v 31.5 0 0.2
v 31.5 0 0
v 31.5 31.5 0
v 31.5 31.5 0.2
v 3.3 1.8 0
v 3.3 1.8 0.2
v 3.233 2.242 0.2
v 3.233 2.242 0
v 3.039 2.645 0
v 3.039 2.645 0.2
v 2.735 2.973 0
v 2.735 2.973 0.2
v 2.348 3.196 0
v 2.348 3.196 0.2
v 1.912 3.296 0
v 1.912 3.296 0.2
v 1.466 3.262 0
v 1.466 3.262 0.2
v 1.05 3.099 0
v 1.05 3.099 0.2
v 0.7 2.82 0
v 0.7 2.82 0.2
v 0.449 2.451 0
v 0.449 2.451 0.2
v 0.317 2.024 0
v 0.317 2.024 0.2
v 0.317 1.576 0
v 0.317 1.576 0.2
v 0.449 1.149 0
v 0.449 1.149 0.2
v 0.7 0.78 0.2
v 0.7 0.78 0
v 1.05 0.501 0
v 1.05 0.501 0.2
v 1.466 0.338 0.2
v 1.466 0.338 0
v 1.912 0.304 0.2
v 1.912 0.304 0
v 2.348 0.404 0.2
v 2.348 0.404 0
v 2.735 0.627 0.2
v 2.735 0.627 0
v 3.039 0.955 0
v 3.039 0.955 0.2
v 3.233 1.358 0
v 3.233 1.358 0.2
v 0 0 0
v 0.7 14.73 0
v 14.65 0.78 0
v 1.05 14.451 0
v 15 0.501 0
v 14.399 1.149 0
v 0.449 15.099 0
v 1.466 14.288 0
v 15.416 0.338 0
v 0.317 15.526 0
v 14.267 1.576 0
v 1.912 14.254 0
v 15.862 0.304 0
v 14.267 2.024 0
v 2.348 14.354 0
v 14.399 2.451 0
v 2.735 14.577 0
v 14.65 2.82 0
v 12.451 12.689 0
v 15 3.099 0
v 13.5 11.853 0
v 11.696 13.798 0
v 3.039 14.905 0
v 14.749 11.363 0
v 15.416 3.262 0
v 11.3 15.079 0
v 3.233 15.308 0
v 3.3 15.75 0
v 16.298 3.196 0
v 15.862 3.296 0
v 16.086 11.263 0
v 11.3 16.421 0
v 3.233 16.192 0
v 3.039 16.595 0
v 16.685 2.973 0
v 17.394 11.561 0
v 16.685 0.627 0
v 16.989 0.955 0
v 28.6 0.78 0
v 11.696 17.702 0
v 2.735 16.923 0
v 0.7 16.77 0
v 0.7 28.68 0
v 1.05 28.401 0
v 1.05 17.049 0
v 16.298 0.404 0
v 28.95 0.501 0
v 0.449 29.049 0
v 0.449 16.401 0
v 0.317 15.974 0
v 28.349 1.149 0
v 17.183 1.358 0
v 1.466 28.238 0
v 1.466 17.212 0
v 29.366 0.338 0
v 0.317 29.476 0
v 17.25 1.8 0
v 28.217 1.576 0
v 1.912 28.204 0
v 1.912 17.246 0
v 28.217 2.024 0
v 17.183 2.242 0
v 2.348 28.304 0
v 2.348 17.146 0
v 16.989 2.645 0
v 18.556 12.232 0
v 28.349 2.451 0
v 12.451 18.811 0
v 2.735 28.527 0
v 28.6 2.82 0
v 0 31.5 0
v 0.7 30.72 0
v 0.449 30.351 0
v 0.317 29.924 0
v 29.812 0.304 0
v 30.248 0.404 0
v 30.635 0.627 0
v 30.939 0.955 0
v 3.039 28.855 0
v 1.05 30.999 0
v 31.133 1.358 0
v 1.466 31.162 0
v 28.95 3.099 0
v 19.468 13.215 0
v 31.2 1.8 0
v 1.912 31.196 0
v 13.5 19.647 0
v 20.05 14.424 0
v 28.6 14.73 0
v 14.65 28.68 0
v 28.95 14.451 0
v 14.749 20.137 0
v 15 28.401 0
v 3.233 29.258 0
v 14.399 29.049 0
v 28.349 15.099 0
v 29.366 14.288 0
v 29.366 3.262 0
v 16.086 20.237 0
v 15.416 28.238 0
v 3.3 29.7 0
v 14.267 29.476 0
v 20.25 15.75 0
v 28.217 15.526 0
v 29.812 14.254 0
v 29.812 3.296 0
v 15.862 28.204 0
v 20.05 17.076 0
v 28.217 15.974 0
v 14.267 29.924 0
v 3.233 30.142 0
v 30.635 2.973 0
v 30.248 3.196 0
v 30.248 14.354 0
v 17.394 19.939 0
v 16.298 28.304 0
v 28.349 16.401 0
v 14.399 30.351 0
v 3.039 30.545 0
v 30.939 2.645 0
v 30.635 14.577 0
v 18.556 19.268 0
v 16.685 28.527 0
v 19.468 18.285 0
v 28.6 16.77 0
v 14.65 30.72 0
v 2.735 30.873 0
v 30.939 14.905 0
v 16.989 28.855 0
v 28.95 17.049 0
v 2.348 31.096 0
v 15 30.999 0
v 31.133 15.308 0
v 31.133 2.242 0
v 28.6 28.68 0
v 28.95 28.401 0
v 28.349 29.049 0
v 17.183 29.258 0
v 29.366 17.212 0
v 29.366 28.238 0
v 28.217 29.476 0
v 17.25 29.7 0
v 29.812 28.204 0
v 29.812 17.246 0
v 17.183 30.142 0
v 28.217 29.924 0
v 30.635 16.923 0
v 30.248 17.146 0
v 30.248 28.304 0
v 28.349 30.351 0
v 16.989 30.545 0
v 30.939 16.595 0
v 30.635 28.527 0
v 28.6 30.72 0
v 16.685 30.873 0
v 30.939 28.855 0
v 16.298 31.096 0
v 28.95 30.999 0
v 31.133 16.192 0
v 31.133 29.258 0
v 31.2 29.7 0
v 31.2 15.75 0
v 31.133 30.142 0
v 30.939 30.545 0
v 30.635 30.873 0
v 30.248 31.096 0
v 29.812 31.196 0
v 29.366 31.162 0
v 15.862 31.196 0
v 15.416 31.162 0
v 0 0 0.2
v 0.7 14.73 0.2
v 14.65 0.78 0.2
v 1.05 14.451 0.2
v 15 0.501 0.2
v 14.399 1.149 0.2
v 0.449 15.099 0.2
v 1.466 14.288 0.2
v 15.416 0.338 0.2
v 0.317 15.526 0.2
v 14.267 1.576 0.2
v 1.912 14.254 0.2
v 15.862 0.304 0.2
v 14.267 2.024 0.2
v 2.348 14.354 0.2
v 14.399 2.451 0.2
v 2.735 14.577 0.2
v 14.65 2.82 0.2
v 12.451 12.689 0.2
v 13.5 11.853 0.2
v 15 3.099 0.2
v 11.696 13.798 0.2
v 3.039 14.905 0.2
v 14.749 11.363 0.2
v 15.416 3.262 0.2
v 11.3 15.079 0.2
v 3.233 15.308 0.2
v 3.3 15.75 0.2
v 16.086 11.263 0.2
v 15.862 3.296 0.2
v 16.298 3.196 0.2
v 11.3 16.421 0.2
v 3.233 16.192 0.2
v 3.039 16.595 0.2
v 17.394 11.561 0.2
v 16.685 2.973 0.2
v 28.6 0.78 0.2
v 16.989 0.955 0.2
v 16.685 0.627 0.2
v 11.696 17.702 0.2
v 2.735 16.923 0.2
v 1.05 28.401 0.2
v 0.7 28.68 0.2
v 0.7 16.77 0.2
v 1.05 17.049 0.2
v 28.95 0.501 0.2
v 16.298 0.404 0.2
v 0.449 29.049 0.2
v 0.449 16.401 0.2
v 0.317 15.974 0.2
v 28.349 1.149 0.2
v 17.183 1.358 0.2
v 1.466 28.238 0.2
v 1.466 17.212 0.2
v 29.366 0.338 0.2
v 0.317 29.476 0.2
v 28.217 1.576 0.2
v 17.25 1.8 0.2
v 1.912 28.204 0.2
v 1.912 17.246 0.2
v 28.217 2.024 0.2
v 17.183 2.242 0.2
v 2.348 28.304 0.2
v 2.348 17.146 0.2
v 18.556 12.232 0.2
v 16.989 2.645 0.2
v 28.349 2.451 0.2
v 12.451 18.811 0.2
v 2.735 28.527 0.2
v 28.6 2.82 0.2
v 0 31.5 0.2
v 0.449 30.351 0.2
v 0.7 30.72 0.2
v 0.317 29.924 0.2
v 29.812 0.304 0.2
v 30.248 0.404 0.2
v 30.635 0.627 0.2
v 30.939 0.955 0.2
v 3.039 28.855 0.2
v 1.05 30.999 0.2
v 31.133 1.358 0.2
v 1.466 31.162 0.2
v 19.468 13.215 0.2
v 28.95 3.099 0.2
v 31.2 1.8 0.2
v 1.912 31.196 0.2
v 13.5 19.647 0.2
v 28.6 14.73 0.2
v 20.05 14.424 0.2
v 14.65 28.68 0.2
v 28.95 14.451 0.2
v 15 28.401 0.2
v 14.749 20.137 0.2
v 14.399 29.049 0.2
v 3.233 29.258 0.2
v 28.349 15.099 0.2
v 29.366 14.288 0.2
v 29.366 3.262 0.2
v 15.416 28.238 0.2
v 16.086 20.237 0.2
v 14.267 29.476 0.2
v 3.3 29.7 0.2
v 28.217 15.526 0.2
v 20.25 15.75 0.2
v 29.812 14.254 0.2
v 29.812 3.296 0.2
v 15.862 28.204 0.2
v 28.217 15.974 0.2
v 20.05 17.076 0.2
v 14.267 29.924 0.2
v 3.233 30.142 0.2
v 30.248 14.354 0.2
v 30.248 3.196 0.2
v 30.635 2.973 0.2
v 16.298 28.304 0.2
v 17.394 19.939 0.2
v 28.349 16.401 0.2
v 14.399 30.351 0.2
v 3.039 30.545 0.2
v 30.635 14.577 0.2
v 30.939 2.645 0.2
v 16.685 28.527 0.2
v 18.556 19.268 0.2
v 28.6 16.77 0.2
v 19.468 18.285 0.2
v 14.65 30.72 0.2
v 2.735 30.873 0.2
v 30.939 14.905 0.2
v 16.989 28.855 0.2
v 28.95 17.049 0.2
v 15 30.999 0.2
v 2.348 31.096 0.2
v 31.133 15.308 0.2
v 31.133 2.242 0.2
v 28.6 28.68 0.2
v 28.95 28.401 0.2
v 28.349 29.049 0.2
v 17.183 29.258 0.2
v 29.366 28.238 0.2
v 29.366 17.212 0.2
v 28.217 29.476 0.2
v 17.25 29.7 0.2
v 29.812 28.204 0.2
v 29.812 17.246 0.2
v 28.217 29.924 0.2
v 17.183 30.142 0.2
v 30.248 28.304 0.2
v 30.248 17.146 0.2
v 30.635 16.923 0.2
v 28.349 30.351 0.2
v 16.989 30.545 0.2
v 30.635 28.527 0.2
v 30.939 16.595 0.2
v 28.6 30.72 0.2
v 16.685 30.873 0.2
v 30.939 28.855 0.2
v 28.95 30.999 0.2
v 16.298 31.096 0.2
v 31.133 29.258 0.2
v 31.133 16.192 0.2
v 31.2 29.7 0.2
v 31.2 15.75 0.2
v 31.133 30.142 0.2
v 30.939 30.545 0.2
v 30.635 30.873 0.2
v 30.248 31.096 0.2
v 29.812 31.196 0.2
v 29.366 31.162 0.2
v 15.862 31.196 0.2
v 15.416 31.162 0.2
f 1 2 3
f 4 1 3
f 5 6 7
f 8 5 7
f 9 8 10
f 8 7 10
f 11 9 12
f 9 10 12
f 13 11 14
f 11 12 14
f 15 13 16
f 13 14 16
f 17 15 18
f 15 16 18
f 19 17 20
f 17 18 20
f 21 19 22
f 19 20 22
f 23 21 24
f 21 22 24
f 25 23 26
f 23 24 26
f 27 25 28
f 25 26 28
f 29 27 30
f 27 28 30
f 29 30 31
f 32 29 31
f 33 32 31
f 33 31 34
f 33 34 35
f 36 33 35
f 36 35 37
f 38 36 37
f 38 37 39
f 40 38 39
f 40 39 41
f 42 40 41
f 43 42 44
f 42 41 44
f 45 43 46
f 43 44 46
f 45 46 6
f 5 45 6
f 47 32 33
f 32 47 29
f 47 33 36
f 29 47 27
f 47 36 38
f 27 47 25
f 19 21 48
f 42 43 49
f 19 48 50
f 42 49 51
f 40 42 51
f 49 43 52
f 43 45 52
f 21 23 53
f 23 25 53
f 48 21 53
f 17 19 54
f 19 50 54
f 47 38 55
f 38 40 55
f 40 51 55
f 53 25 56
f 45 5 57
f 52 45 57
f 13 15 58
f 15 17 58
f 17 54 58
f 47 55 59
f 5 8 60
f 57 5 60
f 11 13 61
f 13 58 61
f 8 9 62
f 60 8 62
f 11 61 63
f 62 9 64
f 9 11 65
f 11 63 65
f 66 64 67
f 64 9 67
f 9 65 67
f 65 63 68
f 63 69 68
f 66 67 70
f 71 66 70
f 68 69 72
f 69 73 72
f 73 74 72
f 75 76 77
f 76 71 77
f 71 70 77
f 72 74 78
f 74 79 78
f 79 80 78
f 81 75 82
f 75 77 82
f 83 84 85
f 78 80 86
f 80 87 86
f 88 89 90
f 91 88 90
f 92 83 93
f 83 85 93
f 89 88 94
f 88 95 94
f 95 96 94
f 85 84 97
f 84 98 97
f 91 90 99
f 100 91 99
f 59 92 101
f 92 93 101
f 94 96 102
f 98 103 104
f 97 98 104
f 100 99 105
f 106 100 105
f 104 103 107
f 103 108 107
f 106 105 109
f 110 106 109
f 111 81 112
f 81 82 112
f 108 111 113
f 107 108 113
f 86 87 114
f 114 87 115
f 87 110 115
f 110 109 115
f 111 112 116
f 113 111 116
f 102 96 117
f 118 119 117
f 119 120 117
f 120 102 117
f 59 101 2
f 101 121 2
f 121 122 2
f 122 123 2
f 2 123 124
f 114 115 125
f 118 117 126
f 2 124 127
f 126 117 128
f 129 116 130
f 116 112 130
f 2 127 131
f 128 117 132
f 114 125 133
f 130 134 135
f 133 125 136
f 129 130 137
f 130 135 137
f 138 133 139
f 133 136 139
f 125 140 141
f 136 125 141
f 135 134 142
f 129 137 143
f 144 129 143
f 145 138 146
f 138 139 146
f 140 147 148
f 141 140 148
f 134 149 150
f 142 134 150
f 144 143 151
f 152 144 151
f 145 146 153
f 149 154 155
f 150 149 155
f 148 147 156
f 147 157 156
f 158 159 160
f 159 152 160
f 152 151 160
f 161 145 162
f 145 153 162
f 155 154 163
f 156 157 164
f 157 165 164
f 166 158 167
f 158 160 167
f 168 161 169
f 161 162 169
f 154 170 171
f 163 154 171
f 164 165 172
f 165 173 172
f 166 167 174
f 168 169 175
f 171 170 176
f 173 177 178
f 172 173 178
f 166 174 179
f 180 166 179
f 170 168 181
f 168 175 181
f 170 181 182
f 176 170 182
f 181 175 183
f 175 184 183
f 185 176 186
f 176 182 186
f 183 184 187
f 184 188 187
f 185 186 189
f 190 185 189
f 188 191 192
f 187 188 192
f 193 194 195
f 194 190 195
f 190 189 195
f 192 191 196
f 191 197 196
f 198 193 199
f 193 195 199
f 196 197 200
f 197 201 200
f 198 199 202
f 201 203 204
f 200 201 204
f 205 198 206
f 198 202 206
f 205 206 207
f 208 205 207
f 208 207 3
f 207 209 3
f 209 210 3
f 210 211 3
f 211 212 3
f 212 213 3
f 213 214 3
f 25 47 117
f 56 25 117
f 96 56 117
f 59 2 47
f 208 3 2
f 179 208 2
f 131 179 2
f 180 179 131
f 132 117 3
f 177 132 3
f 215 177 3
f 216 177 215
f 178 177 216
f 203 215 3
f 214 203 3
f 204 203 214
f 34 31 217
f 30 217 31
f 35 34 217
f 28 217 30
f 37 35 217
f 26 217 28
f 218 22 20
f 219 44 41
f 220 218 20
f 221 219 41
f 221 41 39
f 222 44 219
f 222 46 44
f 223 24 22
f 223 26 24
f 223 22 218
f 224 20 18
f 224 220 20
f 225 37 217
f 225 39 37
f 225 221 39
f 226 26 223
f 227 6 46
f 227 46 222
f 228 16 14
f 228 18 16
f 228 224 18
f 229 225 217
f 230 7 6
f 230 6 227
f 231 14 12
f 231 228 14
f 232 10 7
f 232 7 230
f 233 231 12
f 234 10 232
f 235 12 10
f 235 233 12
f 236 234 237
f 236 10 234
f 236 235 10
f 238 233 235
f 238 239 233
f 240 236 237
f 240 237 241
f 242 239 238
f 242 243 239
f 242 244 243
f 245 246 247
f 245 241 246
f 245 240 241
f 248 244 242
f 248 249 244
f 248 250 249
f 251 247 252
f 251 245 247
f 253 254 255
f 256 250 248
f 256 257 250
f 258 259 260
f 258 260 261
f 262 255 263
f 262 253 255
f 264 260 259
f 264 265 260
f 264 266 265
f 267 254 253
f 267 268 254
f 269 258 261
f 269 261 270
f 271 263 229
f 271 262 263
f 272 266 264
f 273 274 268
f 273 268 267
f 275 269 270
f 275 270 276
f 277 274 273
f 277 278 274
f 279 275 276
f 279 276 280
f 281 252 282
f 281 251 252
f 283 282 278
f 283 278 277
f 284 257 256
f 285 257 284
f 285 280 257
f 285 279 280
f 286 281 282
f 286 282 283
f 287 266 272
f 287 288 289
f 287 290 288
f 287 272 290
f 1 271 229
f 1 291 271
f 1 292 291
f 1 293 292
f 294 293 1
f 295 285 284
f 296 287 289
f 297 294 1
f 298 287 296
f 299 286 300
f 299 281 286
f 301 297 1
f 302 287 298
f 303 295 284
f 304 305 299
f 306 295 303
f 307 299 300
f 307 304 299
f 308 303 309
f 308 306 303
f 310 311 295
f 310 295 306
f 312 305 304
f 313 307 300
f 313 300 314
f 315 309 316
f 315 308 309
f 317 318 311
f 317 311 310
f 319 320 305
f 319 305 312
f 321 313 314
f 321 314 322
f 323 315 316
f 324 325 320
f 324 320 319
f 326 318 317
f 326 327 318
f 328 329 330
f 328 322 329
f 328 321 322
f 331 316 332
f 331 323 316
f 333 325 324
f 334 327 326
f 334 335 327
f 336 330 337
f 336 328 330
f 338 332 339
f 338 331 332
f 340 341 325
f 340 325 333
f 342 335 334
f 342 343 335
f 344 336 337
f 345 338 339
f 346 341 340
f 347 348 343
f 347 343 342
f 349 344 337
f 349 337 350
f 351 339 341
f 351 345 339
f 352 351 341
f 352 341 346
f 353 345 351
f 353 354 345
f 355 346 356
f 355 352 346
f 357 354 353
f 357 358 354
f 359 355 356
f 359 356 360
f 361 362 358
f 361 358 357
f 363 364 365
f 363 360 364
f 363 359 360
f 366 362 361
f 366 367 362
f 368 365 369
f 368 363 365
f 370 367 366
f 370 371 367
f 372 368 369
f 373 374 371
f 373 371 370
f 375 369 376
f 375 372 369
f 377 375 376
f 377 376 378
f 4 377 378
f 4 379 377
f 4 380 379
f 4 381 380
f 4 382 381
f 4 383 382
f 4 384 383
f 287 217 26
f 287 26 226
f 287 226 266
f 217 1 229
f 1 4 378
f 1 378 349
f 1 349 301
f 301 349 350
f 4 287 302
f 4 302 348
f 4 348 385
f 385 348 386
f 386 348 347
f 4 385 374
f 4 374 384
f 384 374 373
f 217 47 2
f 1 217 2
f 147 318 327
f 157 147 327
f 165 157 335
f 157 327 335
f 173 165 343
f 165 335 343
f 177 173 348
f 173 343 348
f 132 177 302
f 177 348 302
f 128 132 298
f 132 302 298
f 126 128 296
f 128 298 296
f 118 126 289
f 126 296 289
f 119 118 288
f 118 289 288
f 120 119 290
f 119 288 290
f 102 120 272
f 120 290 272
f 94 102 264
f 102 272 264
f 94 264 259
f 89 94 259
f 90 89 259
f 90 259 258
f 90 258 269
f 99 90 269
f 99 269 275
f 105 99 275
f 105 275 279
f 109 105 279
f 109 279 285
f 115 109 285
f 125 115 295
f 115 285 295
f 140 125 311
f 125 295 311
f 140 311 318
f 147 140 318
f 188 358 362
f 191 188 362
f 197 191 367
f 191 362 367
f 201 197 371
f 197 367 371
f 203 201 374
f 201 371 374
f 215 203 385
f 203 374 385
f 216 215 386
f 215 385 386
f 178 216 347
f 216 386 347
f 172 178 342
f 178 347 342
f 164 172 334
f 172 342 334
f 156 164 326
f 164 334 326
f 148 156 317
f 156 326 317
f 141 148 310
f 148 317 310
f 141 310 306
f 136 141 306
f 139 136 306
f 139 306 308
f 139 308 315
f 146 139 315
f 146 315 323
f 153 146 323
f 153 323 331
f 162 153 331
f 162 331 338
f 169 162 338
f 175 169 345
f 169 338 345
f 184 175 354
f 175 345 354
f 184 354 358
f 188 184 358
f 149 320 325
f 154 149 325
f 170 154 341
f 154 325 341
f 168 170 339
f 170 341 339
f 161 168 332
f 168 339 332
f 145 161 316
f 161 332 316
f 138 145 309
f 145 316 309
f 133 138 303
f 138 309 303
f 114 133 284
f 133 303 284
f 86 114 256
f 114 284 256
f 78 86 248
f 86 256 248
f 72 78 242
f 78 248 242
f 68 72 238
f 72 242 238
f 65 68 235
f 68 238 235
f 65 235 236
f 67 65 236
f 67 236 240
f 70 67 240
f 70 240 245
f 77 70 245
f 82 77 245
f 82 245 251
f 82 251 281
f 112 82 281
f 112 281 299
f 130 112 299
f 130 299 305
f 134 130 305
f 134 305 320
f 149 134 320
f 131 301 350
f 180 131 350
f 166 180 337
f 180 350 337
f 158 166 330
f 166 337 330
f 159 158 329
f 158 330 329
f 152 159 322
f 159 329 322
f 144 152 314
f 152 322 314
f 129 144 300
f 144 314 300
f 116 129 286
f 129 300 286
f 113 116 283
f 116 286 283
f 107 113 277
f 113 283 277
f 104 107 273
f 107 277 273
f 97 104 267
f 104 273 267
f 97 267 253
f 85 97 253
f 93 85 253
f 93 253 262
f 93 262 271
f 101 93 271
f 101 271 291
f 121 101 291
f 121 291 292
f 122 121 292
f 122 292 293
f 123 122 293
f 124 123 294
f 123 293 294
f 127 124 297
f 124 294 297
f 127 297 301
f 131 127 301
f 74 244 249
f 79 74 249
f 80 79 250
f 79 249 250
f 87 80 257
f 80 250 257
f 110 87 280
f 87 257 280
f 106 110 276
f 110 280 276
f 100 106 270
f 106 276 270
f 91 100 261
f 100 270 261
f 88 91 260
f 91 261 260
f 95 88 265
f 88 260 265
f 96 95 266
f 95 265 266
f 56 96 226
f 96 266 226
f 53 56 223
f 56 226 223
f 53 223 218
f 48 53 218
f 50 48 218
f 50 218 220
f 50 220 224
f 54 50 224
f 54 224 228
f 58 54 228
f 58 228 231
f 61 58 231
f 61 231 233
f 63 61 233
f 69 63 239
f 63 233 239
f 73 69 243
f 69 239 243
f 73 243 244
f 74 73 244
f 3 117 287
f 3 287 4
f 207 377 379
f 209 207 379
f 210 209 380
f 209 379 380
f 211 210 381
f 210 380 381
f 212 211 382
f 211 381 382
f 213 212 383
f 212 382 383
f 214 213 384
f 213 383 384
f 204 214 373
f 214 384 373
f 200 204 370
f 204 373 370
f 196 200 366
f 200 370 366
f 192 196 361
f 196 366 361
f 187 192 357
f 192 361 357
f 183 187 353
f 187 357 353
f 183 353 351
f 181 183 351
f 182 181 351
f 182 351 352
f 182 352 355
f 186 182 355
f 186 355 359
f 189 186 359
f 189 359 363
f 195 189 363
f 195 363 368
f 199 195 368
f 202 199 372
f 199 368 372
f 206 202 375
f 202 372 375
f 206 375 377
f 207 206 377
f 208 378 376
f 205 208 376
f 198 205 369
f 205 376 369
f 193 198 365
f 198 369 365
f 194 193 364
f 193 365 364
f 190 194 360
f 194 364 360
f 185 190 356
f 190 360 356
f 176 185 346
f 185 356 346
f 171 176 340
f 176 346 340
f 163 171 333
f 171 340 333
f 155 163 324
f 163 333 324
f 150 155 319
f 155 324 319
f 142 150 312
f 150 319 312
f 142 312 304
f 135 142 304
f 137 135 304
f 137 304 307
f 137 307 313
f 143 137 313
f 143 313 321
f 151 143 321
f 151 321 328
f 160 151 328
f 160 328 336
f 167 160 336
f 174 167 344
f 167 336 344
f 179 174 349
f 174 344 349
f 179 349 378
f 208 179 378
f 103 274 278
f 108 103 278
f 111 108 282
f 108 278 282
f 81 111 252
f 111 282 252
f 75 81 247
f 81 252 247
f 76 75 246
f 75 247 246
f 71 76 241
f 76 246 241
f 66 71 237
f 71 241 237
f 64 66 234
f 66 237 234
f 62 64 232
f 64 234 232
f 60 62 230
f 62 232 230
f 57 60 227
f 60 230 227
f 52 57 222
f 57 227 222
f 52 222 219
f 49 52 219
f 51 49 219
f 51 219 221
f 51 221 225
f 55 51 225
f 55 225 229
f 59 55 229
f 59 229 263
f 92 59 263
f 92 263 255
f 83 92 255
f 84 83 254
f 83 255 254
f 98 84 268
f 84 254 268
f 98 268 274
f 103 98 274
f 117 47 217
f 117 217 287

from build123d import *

# Parameters (mm, degrees)
SKETCH_1_W          = 31.5
SKETCH_1_H          = 31.5
EXTRUDE_1_DEPTH     = 0.2
SKETCH_2_R          = 4.5
CUT_EXTRUDE_1_DEPTH = 10
SKETCH_3_R          = 1.5
SKETCH_3_R_2        = 4.5
CUT_EXTRUDE_2_DEPTH = 0.2


with BuildPart() as part:
    # 스케치1 → 보스-돌출1 (new body)
    with BuildSketch(Plane.XY):
        with Locations((15.75, 15.75)):
            Rectangle(SKETCH_1_W, SKETCH_1_H)
    extrude(amount=EXTRUDE_1_DEPTH)

    # 스케치2 → 컷-돌출1 (cut)
    with BuildSketch(Plane.XY.offset(0.2)):
        with Locations((15.75, 15.75)):
            Circle(SKETCH_2_R)
    extrude(amount=-CUT_EXTRUDE_1_DEPTH, mode=Mode.SUBTRACT)

    # 스케치3 → 컷-돌출2 (cut)
    with BuildSketch(Plane.XY.offset(0.2)):
        with Locations((29.7, 15.75)):
            Circle(SKETCH_3_R)
        with Locations((15.75, 15.75)):
            Circle(SKETCH_3_R_2)
        with Locations((15.75, 1.8)):
            Circle(SKETCH_3_R)
        with Locations((1.8, 15.75)):
            Circle(SKETCH_3_R)
        with Locations((15.75, 29.7)):
            Circle(SKETCH_3_R)
        with Locations((1.8, 29.7)):
            Circle(SKETCH_3_R)
        with Locations((29.7, 29.7)):
            Circle(SKETCH_3_R)
        with Locations((29.7, 1.8)):
            Circle(SKETCH_3_R)
        with Locations((1.8, 1.8)):
            Circle(SKETCH_3_R)
    extrude(amount=-CUT_EXTRUDE_2_DEPTH, mode=Mode.SUBTRACT)


solid = part.part
